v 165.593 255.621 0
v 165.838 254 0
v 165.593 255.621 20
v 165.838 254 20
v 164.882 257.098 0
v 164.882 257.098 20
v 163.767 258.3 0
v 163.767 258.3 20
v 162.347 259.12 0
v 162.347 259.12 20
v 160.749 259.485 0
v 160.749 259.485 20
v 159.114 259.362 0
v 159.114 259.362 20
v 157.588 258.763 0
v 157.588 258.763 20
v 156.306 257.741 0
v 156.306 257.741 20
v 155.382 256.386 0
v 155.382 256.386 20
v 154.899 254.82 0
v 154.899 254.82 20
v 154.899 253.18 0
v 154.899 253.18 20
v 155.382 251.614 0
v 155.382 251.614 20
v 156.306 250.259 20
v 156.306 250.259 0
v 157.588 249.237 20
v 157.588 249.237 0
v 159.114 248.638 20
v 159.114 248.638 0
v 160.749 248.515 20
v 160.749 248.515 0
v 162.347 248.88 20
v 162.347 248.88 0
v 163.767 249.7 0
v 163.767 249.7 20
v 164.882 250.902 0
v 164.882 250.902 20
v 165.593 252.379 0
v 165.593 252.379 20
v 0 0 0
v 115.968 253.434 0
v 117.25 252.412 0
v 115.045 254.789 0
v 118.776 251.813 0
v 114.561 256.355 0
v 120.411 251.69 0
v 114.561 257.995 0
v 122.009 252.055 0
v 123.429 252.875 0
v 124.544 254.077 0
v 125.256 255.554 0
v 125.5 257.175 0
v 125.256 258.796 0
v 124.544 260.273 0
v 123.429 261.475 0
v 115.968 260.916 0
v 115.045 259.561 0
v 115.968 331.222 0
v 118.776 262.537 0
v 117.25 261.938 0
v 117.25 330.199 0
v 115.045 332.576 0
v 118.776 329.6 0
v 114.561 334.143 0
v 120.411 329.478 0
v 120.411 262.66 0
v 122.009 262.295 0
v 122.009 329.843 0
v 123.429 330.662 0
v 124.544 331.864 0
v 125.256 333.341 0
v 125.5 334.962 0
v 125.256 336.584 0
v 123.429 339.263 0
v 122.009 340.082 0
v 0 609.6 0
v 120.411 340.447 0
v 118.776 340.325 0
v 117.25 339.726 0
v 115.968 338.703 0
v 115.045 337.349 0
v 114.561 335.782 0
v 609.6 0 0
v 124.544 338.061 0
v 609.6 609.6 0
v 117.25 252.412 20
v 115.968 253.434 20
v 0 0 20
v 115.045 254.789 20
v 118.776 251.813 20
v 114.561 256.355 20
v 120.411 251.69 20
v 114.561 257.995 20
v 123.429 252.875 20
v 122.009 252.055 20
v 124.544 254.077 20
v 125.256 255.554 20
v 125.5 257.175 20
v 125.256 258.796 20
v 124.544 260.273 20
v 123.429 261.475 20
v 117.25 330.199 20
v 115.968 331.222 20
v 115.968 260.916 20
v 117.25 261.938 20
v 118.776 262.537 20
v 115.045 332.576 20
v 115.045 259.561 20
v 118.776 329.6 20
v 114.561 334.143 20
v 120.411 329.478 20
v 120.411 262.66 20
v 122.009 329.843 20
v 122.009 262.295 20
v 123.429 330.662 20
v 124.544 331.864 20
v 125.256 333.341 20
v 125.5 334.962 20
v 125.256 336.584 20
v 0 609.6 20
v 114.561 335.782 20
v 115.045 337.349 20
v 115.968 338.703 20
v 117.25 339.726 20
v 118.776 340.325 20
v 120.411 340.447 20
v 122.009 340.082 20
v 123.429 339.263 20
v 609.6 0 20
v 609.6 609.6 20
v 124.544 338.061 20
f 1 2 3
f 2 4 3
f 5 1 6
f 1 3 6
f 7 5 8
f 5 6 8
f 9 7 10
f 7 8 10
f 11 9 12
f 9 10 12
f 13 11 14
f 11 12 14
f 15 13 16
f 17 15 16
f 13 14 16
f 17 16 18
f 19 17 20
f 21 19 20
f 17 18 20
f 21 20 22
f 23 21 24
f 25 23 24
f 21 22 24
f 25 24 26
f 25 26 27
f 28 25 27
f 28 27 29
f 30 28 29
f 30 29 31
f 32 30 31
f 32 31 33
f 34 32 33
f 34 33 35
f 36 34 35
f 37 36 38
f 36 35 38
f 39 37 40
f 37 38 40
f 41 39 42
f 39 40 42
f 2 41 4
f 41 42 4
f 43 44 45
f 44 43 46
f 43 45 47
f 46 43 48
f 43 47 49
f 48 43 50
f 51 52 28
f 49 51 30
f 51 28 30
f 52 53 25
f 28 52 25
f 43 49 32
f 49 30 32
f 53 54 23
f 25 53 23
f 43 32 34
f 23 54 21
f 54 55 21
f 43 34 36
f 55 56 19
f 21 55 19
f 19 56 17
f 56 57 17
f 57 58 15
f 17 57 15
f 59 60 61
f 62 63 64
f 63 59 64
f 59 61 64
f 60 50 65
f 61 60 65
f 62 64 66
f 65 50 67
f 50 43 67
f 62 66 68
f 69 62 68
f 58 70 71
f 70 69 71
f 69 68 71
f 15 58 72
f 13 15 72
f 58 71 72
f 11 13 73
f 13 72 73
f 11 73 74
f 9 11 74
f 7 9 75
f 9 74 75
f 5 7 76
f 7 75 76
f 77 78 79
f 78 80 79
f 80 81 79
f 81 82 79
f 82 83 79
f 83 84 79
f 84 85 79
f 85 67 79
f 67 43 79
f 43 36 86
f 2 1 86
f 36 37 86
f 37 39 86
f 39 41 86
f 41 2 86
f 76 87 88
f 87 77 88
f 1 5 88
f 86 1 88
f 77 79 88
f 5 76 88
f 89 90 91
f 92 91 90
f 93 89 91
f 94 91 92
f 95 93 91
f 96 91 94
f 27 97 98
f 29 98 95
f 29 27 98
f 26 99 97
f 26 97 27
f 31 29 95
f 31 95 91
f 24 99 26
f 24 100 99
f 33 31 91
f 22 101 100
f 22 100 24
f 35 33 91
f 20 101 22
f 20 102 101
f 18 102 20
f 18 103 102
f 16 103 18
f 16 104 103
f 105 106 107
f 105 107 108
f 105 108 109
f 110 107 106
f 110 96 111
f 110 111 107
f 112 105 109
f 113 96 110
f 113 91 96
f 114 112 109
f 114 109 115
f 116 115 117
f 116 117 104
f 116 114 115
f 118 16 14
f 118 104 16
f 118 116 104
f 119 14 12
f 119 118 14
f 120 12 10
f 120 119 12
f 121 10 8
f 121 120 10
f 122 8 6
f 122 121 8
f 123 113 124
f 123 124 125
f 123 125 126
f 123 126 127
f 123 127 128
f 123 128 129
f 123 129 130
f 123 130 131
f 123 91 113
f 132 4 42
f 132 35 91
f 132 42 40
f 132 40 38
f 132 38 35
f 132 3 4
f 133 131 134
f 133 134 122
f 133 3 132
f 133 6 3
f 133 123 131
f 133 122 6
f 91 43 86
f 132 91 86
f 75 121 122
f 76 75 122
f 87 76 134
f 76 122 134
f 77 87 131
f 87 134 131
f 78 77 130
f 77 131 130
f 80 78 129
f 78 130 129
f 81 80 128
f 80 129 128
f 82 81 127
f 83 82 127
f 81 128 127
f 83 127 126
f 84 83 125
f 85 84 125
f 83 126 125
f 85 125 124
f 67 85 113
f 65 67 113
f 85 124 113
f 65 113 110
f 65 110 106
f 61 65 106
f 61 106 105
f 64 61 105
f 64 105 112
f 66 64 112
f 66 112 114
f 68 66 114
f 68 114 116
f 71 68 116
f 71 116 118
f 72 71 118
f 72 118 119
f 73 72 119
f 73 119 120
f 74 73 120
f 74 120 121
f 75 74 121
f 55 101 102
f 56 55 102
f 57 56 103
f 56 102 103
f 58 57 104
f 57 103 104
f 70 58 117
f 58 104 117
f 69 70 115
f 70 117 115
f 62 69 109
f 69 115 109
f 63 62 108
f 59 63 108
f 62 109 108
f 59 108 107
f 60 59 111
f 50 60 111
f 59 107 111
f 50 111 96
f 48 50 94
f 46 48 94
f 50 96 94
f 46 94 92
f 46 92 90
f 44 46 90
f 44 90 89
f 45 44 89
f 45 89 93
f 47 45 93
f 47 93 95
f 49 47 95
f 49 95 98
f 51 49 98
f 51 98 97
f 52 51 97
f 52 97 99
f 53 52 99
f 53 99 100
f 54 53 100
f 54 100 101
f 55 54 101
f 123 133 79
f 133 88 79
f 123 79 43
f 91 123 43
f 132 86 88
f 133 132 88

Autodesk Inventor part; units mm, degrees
ref_plane "YZ Plane" through (0, 0, 0) normal (1, 0, 0) x (0, 1, 0)
ref_plane "XZ Plane" through (0, 0, 0) normal (0, 1, 0) x (-1, 0, 0)
ref_plane "XY Plane" through (0, 0, 0) normal (0, 0, 1) x (1, 0, 0)
sketch "Sketch1" plane through (0, 0, 0) normal (0, 0, 1) x (1, 0, 0)
  line L0 (0, 0) -> (609.6, 0)
  line L1 (609.6, 0) -> (609.6, 609.6)
  line L2 (609.6, 609.6) -> (0, 609.6)
  line L3 (0, 609.6) -> (0, 0)
  dimension "d0" = 609.6
  dimension "d1" = 609.6
extrude "Extrusion1" add sketch "Sketch1" along normal blind 20
sketch "Sketch2" plane through (0, 0, 20) normal (0, 0, 1) x (1, 0, 0)
  point P0 (0, 0)
sketch "Sketch3" plane through (0, 0, 20) normal (0, 0, 1) x (1, 0, 0)
  point P0 (0, 0)
sketch "Sketch4" plane through (0, 0, 20) normal (0, 0, 1) x (1, 0, 0)
  point P0 (0, 0)
sketch "Sketch5" plane through (0, 0, 20) normal (0, 0, 1) x (1, 0, 0)
  line L0 (0, 609.6) -> (0, 0) projected
  line L1 (0, 254) -> (160.3375, 254)
  circle A0 centre (160.3375, 254) radius 5.5
  dimension "d4" = 11
extrude "Extrusion2" cut sketch "Sketch5" against normal through all
sketch "Sketch6" plane through (0, 0, 20) normal (0, 0, 1) x (1, 0, 0)
  point P0 (0, 0)
sketch "Sketch7" plane through (0, 0, 20) normal (0, 0, 1) x (1, 0, 0)
  line L0 (0, 257.175) -> (120, 257.175)
  line L1 (0, 609.6) -> (0, 0) projected
  line L2 (0, 334.9625) -> (120, 334.9625)
  circle A0 centre (120, 334.9625) radius 5.5
  circle A1 centre (120, 257.175) radius 5.5
  dimension "d7" = 120
  dimension "d8" = 11
  dimension "d9" = 11
extrude "Extrusion3" cut sketch "Sketch7" against normal through all
properties part number "base"
